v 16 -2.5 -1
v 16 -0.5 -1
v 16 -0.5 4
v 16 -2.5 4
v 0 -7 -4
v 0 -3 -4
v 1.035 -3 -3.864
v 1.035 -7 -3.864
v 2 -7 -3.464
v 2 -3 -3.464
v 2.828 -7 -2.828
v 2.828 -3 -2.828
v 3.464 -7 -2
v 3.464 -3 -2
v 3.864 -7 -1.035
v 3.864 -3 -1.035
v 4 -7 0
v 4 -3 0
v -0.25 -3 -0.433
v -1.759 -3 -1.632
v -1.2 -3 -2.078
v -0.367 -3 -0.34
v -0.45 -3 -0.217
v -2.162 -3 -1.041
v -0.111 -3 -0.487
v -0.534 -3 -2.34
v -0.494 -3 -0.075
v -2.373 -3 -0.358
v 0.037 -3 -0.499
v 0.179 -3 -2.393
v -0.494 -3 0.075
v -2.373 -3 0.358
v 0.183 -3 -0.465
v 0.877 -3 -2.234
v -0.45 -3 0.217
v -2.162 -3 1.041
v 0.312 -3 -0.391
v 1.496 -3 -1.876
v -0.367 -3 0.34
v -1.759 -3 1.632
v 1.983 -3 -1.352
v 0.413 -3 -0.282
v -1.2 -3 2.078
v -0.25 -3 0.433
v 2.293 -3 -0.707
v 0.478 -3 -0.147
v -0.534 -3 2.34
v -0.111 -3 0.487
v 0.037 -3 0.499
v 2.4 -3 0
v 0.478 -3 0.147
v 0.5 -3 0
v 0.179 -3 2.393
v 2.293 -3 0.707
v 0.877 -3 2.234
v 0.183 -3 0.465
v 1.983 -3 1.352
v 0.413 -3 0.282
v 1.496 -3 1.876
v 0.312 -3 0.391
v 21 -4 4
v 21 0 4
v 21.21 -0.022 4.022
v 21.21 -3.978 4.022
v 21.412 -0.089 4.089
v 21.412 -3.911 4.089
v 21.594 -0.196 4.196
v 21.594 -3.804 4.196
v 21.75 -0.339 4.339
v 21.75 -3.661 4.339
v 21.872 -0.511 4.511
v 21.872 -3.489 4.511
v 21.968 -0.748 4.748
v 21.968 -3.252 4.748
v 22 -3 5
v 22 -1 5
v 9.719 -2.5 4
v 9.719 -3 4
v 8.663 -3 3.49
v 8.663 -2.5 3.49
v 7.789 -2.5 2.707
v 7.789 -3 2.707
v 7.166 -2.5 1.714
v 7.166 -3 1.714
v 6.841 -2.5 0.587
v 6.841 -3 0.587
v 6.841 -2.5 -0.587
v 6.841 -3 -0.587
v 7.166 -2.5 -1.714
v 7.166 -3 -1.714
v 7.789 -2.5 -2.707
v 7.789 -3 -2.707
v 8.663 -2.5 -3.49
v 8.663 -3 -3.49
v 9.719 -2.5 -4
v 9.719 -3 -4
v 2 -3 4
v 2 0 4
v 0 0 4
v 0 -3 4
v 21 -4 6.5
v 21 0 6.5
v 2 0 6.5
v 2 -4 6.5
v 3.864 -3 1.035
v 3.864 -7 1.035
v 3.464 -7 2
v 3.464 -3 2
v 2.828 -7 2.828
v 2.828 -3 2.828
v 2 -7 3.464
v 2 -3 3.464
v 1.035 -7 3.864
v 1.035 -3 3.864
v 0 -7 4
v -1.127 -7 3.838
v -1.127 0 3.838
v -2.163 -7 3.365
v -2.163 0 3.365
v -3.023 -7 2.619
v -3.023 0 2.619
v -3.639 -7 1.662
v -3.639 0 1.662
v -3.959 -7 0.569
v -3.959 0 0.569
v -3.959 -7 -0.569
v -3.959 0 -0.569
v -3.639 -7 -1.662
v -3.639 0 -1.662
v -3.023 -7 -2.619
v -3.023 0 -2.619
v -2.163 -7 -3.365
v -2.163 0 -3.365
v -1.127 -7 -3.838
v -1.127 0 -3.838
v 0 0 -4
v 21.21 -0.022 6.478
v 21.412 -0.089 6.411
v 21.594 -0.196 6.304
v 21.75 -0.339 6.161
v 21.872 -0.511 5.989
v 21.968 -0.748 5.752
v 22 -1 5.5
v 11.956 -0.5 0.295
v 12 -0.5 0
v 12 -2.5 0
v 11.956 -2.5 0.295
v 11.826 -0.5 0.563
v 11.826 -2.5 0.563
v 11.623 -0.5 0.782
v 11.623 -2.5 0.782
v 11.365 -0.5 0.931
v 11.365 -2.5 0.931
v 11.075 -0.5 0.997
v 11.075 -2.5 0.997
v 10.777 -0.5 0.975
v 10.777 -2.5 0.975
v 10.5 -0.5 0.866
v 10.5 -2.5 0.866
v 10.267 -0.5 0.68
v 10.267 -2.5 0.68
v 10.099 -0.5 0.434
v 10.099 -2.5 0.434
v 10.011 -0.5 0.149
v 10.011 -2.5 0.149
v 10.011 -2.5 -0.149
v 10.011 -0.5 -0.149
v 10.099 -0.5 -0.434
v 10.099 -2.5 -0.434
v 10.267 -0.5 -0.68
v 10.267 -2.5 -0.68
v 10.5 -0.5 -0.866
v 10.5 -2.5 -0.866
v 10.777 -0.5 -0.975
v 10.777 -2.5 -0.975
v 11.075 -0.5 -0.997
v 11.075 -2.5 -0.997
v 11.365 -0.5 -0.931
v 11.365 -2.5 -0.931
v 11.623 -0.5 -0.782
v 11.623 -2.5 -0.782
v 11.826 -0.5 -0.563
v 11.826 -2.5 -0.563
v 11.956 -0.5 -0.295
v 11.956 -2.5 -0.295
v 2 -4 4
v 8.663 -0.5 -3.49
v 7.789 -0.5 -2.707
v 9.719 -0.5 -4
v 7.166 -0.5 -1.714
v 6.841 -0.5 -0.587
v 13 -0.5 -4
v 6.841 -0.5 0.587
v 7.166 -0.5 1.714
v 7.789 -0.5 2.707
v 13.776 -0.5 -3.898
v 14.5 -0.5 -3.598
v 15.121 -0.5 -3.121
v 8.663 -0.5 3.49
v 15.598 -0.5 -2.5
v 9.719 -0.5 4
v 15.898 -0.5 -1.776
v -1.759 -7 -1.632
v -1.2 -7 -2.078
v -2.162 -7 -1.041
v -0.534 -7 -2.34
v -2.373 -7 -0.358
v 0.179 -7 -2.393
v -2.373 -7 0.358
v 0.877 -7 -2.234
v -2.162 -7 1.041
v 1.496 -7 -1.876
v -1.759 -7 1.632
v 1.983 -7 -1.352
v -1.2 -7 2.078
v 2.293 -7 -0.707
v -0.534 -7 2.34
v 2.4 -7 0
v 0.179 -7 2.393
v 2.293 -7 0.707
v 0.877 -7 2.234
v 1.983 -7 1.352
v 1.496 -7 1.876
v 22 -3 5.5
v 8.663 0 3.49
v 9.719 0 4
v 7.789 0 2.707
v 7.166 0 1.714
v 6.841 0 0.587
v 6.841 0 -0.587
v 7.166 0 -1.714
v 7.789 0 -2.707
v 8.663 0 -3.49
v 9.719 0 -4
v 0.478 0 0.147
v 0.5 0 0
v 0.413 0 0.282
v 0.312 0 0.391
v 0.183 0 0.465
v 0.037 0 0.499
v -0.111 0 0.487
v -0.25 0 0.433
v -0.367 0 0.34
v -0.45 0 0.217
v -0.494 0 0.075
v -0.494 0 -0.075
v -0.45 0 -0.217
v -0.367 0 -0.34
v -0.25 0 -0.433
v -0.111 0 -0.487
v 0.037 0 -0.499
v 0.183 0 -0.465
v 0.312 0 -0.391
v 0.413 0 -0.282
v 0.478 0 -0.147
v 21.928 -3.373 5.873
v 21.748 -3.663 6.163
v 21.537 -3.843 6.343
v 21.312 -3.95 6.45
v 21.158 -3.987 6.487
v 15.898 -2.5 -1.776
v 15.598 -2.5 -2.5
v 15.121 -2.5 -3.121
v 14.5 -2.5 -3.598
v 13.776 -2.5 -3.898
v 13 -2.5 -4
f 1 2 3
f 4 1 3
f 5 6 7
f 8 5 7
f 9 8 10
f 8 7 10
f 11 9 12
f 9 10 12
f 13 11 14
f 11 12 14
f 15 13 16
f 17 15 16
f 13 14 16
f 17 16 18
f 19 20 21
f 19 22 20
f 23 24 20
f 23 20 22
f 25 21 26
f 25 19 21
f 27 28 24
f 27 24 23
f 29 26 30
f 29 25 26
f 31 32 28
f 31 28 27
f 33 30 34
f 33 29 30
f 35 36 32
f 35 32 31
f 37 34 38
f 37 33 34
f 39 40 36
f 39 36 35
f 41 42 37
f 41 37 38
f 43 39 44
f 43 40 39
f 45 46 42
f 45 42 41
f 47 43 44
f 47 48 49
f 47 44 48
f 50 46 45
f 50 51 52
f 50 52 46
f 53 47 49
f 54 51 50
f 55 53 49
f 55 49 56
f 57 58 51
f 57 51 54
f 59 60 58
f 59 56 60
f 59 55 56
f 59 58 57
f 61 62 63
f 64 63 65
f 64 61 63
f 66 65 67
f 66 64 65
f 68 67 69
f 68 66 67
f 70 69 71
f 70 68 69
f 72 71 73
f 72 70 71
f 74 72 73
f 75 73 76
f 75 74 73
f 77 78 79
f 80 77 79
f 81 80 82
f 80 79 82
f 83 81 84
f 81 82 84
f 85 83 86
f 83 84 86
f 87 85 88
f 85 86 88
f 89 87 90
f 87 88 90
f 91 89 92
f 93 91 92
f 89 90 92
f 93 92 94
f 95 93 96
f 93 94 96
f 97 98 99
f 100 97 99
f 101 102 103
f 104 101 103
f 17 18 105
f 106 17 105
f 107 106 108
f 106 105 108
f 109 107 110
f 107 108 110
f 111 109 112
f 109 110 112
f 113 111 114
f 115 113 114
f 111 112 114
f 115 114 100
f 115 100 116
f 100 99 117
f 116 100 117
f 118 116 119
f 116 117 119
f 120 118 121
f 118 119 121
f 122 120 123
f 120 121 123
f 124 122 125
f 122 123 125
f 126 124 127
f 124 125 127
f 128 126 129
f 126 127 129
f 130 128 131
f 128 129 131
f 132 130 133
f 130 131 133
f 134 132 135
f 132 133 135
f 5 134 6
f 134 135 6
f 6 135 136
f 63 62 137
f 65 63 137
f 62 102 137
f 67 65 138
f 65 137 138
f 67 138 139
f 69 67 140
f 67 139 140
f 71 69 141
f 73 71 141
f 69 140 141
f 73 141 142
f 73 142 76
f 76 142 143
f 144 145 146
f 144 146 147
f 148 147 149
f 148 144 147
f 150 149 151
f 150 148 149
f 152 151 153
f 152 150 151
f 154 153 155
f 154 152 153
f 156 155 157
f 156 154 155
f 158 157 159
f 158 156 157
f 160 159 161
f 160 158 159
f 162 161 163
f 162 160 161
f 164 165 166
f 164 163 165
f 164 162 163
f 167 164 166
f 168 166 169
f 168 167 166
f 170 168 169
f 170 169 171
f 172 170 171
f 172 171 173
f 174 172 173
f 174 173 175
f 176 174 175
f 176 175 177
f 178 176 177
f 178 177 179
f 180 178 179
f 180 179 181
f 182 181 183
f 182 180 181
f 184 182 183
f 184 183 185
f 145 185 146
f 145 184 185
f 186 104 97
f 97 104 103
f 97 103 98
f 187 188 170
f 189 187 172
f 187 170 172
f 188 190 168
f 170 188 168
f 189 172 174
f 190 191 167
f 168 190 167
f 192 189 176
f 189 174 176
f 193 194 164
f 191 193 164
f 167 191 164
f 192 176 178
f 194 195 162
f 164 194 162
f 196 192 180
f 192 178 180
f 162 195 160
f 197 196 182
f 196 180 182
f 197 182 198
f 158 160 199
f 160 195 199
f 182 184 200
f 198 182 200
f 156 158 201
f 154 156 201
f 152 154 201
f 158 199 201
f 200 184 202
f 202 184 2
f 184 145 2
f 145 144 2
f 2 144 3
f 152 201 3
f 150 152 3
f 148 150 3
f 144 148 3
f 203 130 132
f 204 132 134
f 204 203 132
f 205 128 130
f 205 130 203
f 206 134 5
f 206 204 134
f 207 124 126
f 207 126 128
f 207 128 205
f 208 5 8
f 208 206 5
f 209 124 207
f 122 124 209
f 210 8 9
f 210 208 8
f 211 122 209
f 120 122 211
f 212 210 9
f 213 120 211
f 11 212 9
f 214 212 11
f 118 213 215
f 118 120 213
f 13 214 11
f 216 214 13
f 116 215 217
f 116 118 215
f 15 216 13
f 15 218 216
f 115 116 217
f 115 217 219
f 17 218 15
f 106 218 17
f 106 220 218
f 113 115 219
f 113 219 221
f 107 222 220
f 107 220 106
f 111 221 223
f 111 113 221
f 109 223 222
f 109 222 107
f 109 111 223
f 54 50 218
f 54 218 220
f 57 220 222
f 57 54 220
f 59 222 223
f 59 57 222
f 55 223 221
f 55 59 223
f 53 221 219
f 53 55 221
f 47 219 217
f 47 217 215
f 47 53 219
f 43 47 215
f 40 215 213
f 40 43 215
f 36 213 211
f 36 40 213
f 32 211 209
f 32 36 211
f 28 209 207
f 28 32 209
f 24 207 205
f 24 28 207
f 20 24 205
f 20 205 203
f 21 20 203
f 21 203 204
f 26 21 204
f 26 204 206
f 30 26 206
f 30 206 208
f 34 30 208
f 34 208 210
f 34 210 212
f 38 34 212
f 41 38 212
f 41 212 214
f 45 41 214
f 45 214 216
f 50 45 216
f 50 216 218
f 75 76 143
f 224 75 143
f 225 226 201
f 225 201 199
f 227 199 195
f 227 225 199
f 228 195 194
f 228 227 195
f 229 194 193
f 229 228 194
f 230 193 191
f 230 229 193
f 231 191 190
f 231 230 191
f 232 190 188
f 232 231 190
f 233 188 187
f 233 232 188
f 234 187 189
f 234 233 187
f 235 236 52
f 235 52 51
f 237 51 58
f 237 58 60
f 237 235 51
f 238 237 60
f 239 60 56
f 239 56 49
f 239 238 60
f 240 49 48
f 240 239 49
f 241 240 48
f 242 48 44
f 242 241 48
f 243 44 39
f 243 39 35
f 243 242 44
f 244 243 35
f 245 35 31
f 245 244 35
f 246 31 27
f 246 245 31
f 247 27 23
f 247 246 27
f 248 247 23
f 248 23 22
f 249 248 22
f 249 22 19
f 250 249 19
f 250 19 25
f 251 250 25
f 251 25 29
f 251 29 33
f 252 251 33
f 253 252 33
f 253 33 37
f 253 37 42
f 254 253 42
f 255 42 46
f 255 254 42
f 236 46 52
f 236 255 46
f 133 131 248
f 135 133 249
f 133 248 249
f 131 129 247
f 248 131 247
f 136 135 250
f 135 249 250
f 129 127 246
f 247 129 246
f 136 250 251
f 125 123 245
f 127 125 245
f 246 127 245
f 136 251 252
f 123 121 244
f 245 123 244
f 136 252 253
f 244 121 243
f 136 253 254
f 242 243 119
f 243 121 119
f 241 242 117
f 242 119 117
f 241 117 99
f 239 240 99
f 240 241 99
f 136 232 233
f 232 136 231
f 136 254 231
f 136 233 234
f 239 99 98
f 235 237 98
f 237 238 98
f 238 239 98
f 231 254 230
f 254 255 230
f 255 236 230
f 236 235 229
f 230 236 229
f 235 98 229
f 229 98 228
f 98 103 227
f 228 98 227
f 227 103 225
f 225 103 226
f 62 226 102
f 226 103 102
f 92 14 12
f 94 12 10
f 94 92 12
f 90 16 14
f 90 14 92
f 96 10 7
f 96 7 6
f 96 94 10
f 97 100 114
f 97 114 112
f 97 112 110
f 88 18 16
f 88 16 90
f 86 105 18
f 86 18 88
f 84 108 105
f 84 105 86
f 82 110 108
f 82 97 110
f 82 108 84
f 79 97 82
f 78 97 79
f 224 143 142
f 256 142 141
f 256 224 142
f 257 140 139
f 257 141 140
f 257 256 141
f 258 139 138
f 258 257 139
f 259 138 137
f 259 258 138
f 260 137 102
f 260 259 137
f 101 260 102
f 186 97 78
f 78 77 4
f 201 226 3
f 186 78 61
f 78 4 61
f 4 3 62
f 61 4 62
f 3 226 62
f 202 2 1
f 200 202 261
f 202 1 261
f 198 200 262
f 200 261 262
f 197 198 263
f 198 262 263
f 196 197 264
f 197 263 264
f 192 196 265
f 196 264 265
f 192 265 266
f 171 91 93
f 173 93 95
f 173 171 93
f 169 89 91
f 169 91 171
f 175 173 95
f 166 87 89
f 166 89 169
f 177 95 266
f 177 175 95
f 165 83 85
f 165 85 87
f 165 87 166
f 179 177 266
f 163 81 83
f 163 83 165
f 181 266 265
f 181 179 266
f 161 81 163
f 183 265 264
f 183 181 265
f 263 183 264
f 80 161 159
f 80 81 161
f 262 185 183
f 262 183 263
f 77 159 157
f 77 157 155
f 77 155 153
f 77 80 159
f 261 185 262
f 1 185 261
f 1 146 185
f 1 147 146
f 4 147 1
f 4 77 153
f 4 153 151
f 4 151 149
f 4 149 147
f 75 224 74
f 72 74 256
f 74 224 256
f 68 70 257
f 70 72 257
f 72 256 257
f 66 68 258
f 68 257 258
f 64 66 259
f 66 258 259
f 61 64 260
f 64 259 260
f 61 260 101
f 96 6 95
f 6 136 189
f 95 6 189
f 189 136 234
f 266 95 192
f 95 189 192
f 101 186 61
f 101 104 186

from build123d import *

# Parameters (mm, degrees)
F0_R      = 1
F1_DEPTH  = 3
F0_R_2    = 2.4
F2_DEPTH  = 7
F0_R_3    = 0.5
F3_DEPTH  = 3
F6_DEPTH  = 0.5
F7_DEPTH  = 4
F8_R      = 3
F9_R      = 1
F11_DEPTH = 0.5


with BuildPart() as f1:
    # F0 (on Front) → F1 (new body)
    with BuildSketch(Plane.XZ):
        with BuildLine():
            ThreePointArc((0, 4), (2.828427, 2.828427), (4, 0))
            ThreePointArc((4, 0), (2.828427, -2.828427), (0, -4))
            Line((0, -4), (16, -4))
            Line((16, -4), (16, 0))
            Line((16, 0), (16, 4))
            Line((16, 4), (6, 4))
            Line((6, 4), (2, 4))
            Line((2, 4), (0, 4))
        make_face()
        with Locations((11, 0)):
            Circle(F0_R, mode=Mode.SUBTRACT)
    extrude(amount=F1_DEPTH)

    # F0 (on Front) → F2 (join)
    with BuildSketch(Plane.XZ):
        with BuildLine():
            ThreePointArc((0, -4), (2.828427, -2.828427), (4, 0))
            ThreePointArc((4, 0), (2.828427, 2.828427), (0, 4))
            ThreePointArc((0, 4), (-4, 0), (0, -4))
        make_face()
        Circle(F0_R_2, mode=Mode.SUBTRACT)
    extrude(amount=F2_DEPTH)

    # F0 (on Front) → F3 (join)
    with BuildSketch(Plane.XZ):
        Circle(F0_R_2)
        Circle(F0_R_3, mode=Mode.SUBTRACT)
    extrude(amount=F3_DEPTH)

    # F5 (on Front) → F6 (cut)
    with BuildSketch(Plane.XZ):
        with BuildLine():
            Line((19.387725, -4), (19.387725, 4))
            Line((19.387725, 4), (9.719375, 4))
            ThreePointArc((9.719375, 4), (6.8, 0), (9.719375, -4))
            Line((9.719375, -4), (19.387725, -4))
        make_face()
    extrude(amount=F6_DEPTH, mode=Mode.SUBTRACT)

    # F0 (on Front) → F7 (join)
    with BuildSketch(Plane.XZ):
        Polygon((2, 6.5), (2, 4), (6, 4), (16, 4), (22, 4), (22, 6.5), align=None)
    extrude(amount=F7_DEPTH)

    # F8
    f8_edges = [f1.edges().sort_by_distance(p)[0] for p in [
        (16, -1.75, -4),
    ]]
    fillet(f8_edges, radius=F8_R)

    # F9
    f9_edges = [f1.edges().sort_by_distance(p)[0] for p in [
        (22, -2, 4),
        (22, -4, 5.25),
        (22, 0, 5.25),
        (22, -2, 6.5),
    ]]
    fillet(f9_edges, radius=F9_R)

    # F10 (on offset) → F11 (cut)
    with BuildSketch(Plane.XZ.offset(3)):
        with BuildLine():
            Line((19.387725, -4), (19.387725, 4))
            Line((19.387725, 4), (9.719375, 4))
            ThreePointArc((9.719375, 4), (6.8, 0), (9.719375, -4))
            Line((9.719375, -4), (19.387725, -4))
        make_face()
    extrude(amount=-F11_DEPTH, mode=Mode.SUBTRACT)


solid = f1.part
